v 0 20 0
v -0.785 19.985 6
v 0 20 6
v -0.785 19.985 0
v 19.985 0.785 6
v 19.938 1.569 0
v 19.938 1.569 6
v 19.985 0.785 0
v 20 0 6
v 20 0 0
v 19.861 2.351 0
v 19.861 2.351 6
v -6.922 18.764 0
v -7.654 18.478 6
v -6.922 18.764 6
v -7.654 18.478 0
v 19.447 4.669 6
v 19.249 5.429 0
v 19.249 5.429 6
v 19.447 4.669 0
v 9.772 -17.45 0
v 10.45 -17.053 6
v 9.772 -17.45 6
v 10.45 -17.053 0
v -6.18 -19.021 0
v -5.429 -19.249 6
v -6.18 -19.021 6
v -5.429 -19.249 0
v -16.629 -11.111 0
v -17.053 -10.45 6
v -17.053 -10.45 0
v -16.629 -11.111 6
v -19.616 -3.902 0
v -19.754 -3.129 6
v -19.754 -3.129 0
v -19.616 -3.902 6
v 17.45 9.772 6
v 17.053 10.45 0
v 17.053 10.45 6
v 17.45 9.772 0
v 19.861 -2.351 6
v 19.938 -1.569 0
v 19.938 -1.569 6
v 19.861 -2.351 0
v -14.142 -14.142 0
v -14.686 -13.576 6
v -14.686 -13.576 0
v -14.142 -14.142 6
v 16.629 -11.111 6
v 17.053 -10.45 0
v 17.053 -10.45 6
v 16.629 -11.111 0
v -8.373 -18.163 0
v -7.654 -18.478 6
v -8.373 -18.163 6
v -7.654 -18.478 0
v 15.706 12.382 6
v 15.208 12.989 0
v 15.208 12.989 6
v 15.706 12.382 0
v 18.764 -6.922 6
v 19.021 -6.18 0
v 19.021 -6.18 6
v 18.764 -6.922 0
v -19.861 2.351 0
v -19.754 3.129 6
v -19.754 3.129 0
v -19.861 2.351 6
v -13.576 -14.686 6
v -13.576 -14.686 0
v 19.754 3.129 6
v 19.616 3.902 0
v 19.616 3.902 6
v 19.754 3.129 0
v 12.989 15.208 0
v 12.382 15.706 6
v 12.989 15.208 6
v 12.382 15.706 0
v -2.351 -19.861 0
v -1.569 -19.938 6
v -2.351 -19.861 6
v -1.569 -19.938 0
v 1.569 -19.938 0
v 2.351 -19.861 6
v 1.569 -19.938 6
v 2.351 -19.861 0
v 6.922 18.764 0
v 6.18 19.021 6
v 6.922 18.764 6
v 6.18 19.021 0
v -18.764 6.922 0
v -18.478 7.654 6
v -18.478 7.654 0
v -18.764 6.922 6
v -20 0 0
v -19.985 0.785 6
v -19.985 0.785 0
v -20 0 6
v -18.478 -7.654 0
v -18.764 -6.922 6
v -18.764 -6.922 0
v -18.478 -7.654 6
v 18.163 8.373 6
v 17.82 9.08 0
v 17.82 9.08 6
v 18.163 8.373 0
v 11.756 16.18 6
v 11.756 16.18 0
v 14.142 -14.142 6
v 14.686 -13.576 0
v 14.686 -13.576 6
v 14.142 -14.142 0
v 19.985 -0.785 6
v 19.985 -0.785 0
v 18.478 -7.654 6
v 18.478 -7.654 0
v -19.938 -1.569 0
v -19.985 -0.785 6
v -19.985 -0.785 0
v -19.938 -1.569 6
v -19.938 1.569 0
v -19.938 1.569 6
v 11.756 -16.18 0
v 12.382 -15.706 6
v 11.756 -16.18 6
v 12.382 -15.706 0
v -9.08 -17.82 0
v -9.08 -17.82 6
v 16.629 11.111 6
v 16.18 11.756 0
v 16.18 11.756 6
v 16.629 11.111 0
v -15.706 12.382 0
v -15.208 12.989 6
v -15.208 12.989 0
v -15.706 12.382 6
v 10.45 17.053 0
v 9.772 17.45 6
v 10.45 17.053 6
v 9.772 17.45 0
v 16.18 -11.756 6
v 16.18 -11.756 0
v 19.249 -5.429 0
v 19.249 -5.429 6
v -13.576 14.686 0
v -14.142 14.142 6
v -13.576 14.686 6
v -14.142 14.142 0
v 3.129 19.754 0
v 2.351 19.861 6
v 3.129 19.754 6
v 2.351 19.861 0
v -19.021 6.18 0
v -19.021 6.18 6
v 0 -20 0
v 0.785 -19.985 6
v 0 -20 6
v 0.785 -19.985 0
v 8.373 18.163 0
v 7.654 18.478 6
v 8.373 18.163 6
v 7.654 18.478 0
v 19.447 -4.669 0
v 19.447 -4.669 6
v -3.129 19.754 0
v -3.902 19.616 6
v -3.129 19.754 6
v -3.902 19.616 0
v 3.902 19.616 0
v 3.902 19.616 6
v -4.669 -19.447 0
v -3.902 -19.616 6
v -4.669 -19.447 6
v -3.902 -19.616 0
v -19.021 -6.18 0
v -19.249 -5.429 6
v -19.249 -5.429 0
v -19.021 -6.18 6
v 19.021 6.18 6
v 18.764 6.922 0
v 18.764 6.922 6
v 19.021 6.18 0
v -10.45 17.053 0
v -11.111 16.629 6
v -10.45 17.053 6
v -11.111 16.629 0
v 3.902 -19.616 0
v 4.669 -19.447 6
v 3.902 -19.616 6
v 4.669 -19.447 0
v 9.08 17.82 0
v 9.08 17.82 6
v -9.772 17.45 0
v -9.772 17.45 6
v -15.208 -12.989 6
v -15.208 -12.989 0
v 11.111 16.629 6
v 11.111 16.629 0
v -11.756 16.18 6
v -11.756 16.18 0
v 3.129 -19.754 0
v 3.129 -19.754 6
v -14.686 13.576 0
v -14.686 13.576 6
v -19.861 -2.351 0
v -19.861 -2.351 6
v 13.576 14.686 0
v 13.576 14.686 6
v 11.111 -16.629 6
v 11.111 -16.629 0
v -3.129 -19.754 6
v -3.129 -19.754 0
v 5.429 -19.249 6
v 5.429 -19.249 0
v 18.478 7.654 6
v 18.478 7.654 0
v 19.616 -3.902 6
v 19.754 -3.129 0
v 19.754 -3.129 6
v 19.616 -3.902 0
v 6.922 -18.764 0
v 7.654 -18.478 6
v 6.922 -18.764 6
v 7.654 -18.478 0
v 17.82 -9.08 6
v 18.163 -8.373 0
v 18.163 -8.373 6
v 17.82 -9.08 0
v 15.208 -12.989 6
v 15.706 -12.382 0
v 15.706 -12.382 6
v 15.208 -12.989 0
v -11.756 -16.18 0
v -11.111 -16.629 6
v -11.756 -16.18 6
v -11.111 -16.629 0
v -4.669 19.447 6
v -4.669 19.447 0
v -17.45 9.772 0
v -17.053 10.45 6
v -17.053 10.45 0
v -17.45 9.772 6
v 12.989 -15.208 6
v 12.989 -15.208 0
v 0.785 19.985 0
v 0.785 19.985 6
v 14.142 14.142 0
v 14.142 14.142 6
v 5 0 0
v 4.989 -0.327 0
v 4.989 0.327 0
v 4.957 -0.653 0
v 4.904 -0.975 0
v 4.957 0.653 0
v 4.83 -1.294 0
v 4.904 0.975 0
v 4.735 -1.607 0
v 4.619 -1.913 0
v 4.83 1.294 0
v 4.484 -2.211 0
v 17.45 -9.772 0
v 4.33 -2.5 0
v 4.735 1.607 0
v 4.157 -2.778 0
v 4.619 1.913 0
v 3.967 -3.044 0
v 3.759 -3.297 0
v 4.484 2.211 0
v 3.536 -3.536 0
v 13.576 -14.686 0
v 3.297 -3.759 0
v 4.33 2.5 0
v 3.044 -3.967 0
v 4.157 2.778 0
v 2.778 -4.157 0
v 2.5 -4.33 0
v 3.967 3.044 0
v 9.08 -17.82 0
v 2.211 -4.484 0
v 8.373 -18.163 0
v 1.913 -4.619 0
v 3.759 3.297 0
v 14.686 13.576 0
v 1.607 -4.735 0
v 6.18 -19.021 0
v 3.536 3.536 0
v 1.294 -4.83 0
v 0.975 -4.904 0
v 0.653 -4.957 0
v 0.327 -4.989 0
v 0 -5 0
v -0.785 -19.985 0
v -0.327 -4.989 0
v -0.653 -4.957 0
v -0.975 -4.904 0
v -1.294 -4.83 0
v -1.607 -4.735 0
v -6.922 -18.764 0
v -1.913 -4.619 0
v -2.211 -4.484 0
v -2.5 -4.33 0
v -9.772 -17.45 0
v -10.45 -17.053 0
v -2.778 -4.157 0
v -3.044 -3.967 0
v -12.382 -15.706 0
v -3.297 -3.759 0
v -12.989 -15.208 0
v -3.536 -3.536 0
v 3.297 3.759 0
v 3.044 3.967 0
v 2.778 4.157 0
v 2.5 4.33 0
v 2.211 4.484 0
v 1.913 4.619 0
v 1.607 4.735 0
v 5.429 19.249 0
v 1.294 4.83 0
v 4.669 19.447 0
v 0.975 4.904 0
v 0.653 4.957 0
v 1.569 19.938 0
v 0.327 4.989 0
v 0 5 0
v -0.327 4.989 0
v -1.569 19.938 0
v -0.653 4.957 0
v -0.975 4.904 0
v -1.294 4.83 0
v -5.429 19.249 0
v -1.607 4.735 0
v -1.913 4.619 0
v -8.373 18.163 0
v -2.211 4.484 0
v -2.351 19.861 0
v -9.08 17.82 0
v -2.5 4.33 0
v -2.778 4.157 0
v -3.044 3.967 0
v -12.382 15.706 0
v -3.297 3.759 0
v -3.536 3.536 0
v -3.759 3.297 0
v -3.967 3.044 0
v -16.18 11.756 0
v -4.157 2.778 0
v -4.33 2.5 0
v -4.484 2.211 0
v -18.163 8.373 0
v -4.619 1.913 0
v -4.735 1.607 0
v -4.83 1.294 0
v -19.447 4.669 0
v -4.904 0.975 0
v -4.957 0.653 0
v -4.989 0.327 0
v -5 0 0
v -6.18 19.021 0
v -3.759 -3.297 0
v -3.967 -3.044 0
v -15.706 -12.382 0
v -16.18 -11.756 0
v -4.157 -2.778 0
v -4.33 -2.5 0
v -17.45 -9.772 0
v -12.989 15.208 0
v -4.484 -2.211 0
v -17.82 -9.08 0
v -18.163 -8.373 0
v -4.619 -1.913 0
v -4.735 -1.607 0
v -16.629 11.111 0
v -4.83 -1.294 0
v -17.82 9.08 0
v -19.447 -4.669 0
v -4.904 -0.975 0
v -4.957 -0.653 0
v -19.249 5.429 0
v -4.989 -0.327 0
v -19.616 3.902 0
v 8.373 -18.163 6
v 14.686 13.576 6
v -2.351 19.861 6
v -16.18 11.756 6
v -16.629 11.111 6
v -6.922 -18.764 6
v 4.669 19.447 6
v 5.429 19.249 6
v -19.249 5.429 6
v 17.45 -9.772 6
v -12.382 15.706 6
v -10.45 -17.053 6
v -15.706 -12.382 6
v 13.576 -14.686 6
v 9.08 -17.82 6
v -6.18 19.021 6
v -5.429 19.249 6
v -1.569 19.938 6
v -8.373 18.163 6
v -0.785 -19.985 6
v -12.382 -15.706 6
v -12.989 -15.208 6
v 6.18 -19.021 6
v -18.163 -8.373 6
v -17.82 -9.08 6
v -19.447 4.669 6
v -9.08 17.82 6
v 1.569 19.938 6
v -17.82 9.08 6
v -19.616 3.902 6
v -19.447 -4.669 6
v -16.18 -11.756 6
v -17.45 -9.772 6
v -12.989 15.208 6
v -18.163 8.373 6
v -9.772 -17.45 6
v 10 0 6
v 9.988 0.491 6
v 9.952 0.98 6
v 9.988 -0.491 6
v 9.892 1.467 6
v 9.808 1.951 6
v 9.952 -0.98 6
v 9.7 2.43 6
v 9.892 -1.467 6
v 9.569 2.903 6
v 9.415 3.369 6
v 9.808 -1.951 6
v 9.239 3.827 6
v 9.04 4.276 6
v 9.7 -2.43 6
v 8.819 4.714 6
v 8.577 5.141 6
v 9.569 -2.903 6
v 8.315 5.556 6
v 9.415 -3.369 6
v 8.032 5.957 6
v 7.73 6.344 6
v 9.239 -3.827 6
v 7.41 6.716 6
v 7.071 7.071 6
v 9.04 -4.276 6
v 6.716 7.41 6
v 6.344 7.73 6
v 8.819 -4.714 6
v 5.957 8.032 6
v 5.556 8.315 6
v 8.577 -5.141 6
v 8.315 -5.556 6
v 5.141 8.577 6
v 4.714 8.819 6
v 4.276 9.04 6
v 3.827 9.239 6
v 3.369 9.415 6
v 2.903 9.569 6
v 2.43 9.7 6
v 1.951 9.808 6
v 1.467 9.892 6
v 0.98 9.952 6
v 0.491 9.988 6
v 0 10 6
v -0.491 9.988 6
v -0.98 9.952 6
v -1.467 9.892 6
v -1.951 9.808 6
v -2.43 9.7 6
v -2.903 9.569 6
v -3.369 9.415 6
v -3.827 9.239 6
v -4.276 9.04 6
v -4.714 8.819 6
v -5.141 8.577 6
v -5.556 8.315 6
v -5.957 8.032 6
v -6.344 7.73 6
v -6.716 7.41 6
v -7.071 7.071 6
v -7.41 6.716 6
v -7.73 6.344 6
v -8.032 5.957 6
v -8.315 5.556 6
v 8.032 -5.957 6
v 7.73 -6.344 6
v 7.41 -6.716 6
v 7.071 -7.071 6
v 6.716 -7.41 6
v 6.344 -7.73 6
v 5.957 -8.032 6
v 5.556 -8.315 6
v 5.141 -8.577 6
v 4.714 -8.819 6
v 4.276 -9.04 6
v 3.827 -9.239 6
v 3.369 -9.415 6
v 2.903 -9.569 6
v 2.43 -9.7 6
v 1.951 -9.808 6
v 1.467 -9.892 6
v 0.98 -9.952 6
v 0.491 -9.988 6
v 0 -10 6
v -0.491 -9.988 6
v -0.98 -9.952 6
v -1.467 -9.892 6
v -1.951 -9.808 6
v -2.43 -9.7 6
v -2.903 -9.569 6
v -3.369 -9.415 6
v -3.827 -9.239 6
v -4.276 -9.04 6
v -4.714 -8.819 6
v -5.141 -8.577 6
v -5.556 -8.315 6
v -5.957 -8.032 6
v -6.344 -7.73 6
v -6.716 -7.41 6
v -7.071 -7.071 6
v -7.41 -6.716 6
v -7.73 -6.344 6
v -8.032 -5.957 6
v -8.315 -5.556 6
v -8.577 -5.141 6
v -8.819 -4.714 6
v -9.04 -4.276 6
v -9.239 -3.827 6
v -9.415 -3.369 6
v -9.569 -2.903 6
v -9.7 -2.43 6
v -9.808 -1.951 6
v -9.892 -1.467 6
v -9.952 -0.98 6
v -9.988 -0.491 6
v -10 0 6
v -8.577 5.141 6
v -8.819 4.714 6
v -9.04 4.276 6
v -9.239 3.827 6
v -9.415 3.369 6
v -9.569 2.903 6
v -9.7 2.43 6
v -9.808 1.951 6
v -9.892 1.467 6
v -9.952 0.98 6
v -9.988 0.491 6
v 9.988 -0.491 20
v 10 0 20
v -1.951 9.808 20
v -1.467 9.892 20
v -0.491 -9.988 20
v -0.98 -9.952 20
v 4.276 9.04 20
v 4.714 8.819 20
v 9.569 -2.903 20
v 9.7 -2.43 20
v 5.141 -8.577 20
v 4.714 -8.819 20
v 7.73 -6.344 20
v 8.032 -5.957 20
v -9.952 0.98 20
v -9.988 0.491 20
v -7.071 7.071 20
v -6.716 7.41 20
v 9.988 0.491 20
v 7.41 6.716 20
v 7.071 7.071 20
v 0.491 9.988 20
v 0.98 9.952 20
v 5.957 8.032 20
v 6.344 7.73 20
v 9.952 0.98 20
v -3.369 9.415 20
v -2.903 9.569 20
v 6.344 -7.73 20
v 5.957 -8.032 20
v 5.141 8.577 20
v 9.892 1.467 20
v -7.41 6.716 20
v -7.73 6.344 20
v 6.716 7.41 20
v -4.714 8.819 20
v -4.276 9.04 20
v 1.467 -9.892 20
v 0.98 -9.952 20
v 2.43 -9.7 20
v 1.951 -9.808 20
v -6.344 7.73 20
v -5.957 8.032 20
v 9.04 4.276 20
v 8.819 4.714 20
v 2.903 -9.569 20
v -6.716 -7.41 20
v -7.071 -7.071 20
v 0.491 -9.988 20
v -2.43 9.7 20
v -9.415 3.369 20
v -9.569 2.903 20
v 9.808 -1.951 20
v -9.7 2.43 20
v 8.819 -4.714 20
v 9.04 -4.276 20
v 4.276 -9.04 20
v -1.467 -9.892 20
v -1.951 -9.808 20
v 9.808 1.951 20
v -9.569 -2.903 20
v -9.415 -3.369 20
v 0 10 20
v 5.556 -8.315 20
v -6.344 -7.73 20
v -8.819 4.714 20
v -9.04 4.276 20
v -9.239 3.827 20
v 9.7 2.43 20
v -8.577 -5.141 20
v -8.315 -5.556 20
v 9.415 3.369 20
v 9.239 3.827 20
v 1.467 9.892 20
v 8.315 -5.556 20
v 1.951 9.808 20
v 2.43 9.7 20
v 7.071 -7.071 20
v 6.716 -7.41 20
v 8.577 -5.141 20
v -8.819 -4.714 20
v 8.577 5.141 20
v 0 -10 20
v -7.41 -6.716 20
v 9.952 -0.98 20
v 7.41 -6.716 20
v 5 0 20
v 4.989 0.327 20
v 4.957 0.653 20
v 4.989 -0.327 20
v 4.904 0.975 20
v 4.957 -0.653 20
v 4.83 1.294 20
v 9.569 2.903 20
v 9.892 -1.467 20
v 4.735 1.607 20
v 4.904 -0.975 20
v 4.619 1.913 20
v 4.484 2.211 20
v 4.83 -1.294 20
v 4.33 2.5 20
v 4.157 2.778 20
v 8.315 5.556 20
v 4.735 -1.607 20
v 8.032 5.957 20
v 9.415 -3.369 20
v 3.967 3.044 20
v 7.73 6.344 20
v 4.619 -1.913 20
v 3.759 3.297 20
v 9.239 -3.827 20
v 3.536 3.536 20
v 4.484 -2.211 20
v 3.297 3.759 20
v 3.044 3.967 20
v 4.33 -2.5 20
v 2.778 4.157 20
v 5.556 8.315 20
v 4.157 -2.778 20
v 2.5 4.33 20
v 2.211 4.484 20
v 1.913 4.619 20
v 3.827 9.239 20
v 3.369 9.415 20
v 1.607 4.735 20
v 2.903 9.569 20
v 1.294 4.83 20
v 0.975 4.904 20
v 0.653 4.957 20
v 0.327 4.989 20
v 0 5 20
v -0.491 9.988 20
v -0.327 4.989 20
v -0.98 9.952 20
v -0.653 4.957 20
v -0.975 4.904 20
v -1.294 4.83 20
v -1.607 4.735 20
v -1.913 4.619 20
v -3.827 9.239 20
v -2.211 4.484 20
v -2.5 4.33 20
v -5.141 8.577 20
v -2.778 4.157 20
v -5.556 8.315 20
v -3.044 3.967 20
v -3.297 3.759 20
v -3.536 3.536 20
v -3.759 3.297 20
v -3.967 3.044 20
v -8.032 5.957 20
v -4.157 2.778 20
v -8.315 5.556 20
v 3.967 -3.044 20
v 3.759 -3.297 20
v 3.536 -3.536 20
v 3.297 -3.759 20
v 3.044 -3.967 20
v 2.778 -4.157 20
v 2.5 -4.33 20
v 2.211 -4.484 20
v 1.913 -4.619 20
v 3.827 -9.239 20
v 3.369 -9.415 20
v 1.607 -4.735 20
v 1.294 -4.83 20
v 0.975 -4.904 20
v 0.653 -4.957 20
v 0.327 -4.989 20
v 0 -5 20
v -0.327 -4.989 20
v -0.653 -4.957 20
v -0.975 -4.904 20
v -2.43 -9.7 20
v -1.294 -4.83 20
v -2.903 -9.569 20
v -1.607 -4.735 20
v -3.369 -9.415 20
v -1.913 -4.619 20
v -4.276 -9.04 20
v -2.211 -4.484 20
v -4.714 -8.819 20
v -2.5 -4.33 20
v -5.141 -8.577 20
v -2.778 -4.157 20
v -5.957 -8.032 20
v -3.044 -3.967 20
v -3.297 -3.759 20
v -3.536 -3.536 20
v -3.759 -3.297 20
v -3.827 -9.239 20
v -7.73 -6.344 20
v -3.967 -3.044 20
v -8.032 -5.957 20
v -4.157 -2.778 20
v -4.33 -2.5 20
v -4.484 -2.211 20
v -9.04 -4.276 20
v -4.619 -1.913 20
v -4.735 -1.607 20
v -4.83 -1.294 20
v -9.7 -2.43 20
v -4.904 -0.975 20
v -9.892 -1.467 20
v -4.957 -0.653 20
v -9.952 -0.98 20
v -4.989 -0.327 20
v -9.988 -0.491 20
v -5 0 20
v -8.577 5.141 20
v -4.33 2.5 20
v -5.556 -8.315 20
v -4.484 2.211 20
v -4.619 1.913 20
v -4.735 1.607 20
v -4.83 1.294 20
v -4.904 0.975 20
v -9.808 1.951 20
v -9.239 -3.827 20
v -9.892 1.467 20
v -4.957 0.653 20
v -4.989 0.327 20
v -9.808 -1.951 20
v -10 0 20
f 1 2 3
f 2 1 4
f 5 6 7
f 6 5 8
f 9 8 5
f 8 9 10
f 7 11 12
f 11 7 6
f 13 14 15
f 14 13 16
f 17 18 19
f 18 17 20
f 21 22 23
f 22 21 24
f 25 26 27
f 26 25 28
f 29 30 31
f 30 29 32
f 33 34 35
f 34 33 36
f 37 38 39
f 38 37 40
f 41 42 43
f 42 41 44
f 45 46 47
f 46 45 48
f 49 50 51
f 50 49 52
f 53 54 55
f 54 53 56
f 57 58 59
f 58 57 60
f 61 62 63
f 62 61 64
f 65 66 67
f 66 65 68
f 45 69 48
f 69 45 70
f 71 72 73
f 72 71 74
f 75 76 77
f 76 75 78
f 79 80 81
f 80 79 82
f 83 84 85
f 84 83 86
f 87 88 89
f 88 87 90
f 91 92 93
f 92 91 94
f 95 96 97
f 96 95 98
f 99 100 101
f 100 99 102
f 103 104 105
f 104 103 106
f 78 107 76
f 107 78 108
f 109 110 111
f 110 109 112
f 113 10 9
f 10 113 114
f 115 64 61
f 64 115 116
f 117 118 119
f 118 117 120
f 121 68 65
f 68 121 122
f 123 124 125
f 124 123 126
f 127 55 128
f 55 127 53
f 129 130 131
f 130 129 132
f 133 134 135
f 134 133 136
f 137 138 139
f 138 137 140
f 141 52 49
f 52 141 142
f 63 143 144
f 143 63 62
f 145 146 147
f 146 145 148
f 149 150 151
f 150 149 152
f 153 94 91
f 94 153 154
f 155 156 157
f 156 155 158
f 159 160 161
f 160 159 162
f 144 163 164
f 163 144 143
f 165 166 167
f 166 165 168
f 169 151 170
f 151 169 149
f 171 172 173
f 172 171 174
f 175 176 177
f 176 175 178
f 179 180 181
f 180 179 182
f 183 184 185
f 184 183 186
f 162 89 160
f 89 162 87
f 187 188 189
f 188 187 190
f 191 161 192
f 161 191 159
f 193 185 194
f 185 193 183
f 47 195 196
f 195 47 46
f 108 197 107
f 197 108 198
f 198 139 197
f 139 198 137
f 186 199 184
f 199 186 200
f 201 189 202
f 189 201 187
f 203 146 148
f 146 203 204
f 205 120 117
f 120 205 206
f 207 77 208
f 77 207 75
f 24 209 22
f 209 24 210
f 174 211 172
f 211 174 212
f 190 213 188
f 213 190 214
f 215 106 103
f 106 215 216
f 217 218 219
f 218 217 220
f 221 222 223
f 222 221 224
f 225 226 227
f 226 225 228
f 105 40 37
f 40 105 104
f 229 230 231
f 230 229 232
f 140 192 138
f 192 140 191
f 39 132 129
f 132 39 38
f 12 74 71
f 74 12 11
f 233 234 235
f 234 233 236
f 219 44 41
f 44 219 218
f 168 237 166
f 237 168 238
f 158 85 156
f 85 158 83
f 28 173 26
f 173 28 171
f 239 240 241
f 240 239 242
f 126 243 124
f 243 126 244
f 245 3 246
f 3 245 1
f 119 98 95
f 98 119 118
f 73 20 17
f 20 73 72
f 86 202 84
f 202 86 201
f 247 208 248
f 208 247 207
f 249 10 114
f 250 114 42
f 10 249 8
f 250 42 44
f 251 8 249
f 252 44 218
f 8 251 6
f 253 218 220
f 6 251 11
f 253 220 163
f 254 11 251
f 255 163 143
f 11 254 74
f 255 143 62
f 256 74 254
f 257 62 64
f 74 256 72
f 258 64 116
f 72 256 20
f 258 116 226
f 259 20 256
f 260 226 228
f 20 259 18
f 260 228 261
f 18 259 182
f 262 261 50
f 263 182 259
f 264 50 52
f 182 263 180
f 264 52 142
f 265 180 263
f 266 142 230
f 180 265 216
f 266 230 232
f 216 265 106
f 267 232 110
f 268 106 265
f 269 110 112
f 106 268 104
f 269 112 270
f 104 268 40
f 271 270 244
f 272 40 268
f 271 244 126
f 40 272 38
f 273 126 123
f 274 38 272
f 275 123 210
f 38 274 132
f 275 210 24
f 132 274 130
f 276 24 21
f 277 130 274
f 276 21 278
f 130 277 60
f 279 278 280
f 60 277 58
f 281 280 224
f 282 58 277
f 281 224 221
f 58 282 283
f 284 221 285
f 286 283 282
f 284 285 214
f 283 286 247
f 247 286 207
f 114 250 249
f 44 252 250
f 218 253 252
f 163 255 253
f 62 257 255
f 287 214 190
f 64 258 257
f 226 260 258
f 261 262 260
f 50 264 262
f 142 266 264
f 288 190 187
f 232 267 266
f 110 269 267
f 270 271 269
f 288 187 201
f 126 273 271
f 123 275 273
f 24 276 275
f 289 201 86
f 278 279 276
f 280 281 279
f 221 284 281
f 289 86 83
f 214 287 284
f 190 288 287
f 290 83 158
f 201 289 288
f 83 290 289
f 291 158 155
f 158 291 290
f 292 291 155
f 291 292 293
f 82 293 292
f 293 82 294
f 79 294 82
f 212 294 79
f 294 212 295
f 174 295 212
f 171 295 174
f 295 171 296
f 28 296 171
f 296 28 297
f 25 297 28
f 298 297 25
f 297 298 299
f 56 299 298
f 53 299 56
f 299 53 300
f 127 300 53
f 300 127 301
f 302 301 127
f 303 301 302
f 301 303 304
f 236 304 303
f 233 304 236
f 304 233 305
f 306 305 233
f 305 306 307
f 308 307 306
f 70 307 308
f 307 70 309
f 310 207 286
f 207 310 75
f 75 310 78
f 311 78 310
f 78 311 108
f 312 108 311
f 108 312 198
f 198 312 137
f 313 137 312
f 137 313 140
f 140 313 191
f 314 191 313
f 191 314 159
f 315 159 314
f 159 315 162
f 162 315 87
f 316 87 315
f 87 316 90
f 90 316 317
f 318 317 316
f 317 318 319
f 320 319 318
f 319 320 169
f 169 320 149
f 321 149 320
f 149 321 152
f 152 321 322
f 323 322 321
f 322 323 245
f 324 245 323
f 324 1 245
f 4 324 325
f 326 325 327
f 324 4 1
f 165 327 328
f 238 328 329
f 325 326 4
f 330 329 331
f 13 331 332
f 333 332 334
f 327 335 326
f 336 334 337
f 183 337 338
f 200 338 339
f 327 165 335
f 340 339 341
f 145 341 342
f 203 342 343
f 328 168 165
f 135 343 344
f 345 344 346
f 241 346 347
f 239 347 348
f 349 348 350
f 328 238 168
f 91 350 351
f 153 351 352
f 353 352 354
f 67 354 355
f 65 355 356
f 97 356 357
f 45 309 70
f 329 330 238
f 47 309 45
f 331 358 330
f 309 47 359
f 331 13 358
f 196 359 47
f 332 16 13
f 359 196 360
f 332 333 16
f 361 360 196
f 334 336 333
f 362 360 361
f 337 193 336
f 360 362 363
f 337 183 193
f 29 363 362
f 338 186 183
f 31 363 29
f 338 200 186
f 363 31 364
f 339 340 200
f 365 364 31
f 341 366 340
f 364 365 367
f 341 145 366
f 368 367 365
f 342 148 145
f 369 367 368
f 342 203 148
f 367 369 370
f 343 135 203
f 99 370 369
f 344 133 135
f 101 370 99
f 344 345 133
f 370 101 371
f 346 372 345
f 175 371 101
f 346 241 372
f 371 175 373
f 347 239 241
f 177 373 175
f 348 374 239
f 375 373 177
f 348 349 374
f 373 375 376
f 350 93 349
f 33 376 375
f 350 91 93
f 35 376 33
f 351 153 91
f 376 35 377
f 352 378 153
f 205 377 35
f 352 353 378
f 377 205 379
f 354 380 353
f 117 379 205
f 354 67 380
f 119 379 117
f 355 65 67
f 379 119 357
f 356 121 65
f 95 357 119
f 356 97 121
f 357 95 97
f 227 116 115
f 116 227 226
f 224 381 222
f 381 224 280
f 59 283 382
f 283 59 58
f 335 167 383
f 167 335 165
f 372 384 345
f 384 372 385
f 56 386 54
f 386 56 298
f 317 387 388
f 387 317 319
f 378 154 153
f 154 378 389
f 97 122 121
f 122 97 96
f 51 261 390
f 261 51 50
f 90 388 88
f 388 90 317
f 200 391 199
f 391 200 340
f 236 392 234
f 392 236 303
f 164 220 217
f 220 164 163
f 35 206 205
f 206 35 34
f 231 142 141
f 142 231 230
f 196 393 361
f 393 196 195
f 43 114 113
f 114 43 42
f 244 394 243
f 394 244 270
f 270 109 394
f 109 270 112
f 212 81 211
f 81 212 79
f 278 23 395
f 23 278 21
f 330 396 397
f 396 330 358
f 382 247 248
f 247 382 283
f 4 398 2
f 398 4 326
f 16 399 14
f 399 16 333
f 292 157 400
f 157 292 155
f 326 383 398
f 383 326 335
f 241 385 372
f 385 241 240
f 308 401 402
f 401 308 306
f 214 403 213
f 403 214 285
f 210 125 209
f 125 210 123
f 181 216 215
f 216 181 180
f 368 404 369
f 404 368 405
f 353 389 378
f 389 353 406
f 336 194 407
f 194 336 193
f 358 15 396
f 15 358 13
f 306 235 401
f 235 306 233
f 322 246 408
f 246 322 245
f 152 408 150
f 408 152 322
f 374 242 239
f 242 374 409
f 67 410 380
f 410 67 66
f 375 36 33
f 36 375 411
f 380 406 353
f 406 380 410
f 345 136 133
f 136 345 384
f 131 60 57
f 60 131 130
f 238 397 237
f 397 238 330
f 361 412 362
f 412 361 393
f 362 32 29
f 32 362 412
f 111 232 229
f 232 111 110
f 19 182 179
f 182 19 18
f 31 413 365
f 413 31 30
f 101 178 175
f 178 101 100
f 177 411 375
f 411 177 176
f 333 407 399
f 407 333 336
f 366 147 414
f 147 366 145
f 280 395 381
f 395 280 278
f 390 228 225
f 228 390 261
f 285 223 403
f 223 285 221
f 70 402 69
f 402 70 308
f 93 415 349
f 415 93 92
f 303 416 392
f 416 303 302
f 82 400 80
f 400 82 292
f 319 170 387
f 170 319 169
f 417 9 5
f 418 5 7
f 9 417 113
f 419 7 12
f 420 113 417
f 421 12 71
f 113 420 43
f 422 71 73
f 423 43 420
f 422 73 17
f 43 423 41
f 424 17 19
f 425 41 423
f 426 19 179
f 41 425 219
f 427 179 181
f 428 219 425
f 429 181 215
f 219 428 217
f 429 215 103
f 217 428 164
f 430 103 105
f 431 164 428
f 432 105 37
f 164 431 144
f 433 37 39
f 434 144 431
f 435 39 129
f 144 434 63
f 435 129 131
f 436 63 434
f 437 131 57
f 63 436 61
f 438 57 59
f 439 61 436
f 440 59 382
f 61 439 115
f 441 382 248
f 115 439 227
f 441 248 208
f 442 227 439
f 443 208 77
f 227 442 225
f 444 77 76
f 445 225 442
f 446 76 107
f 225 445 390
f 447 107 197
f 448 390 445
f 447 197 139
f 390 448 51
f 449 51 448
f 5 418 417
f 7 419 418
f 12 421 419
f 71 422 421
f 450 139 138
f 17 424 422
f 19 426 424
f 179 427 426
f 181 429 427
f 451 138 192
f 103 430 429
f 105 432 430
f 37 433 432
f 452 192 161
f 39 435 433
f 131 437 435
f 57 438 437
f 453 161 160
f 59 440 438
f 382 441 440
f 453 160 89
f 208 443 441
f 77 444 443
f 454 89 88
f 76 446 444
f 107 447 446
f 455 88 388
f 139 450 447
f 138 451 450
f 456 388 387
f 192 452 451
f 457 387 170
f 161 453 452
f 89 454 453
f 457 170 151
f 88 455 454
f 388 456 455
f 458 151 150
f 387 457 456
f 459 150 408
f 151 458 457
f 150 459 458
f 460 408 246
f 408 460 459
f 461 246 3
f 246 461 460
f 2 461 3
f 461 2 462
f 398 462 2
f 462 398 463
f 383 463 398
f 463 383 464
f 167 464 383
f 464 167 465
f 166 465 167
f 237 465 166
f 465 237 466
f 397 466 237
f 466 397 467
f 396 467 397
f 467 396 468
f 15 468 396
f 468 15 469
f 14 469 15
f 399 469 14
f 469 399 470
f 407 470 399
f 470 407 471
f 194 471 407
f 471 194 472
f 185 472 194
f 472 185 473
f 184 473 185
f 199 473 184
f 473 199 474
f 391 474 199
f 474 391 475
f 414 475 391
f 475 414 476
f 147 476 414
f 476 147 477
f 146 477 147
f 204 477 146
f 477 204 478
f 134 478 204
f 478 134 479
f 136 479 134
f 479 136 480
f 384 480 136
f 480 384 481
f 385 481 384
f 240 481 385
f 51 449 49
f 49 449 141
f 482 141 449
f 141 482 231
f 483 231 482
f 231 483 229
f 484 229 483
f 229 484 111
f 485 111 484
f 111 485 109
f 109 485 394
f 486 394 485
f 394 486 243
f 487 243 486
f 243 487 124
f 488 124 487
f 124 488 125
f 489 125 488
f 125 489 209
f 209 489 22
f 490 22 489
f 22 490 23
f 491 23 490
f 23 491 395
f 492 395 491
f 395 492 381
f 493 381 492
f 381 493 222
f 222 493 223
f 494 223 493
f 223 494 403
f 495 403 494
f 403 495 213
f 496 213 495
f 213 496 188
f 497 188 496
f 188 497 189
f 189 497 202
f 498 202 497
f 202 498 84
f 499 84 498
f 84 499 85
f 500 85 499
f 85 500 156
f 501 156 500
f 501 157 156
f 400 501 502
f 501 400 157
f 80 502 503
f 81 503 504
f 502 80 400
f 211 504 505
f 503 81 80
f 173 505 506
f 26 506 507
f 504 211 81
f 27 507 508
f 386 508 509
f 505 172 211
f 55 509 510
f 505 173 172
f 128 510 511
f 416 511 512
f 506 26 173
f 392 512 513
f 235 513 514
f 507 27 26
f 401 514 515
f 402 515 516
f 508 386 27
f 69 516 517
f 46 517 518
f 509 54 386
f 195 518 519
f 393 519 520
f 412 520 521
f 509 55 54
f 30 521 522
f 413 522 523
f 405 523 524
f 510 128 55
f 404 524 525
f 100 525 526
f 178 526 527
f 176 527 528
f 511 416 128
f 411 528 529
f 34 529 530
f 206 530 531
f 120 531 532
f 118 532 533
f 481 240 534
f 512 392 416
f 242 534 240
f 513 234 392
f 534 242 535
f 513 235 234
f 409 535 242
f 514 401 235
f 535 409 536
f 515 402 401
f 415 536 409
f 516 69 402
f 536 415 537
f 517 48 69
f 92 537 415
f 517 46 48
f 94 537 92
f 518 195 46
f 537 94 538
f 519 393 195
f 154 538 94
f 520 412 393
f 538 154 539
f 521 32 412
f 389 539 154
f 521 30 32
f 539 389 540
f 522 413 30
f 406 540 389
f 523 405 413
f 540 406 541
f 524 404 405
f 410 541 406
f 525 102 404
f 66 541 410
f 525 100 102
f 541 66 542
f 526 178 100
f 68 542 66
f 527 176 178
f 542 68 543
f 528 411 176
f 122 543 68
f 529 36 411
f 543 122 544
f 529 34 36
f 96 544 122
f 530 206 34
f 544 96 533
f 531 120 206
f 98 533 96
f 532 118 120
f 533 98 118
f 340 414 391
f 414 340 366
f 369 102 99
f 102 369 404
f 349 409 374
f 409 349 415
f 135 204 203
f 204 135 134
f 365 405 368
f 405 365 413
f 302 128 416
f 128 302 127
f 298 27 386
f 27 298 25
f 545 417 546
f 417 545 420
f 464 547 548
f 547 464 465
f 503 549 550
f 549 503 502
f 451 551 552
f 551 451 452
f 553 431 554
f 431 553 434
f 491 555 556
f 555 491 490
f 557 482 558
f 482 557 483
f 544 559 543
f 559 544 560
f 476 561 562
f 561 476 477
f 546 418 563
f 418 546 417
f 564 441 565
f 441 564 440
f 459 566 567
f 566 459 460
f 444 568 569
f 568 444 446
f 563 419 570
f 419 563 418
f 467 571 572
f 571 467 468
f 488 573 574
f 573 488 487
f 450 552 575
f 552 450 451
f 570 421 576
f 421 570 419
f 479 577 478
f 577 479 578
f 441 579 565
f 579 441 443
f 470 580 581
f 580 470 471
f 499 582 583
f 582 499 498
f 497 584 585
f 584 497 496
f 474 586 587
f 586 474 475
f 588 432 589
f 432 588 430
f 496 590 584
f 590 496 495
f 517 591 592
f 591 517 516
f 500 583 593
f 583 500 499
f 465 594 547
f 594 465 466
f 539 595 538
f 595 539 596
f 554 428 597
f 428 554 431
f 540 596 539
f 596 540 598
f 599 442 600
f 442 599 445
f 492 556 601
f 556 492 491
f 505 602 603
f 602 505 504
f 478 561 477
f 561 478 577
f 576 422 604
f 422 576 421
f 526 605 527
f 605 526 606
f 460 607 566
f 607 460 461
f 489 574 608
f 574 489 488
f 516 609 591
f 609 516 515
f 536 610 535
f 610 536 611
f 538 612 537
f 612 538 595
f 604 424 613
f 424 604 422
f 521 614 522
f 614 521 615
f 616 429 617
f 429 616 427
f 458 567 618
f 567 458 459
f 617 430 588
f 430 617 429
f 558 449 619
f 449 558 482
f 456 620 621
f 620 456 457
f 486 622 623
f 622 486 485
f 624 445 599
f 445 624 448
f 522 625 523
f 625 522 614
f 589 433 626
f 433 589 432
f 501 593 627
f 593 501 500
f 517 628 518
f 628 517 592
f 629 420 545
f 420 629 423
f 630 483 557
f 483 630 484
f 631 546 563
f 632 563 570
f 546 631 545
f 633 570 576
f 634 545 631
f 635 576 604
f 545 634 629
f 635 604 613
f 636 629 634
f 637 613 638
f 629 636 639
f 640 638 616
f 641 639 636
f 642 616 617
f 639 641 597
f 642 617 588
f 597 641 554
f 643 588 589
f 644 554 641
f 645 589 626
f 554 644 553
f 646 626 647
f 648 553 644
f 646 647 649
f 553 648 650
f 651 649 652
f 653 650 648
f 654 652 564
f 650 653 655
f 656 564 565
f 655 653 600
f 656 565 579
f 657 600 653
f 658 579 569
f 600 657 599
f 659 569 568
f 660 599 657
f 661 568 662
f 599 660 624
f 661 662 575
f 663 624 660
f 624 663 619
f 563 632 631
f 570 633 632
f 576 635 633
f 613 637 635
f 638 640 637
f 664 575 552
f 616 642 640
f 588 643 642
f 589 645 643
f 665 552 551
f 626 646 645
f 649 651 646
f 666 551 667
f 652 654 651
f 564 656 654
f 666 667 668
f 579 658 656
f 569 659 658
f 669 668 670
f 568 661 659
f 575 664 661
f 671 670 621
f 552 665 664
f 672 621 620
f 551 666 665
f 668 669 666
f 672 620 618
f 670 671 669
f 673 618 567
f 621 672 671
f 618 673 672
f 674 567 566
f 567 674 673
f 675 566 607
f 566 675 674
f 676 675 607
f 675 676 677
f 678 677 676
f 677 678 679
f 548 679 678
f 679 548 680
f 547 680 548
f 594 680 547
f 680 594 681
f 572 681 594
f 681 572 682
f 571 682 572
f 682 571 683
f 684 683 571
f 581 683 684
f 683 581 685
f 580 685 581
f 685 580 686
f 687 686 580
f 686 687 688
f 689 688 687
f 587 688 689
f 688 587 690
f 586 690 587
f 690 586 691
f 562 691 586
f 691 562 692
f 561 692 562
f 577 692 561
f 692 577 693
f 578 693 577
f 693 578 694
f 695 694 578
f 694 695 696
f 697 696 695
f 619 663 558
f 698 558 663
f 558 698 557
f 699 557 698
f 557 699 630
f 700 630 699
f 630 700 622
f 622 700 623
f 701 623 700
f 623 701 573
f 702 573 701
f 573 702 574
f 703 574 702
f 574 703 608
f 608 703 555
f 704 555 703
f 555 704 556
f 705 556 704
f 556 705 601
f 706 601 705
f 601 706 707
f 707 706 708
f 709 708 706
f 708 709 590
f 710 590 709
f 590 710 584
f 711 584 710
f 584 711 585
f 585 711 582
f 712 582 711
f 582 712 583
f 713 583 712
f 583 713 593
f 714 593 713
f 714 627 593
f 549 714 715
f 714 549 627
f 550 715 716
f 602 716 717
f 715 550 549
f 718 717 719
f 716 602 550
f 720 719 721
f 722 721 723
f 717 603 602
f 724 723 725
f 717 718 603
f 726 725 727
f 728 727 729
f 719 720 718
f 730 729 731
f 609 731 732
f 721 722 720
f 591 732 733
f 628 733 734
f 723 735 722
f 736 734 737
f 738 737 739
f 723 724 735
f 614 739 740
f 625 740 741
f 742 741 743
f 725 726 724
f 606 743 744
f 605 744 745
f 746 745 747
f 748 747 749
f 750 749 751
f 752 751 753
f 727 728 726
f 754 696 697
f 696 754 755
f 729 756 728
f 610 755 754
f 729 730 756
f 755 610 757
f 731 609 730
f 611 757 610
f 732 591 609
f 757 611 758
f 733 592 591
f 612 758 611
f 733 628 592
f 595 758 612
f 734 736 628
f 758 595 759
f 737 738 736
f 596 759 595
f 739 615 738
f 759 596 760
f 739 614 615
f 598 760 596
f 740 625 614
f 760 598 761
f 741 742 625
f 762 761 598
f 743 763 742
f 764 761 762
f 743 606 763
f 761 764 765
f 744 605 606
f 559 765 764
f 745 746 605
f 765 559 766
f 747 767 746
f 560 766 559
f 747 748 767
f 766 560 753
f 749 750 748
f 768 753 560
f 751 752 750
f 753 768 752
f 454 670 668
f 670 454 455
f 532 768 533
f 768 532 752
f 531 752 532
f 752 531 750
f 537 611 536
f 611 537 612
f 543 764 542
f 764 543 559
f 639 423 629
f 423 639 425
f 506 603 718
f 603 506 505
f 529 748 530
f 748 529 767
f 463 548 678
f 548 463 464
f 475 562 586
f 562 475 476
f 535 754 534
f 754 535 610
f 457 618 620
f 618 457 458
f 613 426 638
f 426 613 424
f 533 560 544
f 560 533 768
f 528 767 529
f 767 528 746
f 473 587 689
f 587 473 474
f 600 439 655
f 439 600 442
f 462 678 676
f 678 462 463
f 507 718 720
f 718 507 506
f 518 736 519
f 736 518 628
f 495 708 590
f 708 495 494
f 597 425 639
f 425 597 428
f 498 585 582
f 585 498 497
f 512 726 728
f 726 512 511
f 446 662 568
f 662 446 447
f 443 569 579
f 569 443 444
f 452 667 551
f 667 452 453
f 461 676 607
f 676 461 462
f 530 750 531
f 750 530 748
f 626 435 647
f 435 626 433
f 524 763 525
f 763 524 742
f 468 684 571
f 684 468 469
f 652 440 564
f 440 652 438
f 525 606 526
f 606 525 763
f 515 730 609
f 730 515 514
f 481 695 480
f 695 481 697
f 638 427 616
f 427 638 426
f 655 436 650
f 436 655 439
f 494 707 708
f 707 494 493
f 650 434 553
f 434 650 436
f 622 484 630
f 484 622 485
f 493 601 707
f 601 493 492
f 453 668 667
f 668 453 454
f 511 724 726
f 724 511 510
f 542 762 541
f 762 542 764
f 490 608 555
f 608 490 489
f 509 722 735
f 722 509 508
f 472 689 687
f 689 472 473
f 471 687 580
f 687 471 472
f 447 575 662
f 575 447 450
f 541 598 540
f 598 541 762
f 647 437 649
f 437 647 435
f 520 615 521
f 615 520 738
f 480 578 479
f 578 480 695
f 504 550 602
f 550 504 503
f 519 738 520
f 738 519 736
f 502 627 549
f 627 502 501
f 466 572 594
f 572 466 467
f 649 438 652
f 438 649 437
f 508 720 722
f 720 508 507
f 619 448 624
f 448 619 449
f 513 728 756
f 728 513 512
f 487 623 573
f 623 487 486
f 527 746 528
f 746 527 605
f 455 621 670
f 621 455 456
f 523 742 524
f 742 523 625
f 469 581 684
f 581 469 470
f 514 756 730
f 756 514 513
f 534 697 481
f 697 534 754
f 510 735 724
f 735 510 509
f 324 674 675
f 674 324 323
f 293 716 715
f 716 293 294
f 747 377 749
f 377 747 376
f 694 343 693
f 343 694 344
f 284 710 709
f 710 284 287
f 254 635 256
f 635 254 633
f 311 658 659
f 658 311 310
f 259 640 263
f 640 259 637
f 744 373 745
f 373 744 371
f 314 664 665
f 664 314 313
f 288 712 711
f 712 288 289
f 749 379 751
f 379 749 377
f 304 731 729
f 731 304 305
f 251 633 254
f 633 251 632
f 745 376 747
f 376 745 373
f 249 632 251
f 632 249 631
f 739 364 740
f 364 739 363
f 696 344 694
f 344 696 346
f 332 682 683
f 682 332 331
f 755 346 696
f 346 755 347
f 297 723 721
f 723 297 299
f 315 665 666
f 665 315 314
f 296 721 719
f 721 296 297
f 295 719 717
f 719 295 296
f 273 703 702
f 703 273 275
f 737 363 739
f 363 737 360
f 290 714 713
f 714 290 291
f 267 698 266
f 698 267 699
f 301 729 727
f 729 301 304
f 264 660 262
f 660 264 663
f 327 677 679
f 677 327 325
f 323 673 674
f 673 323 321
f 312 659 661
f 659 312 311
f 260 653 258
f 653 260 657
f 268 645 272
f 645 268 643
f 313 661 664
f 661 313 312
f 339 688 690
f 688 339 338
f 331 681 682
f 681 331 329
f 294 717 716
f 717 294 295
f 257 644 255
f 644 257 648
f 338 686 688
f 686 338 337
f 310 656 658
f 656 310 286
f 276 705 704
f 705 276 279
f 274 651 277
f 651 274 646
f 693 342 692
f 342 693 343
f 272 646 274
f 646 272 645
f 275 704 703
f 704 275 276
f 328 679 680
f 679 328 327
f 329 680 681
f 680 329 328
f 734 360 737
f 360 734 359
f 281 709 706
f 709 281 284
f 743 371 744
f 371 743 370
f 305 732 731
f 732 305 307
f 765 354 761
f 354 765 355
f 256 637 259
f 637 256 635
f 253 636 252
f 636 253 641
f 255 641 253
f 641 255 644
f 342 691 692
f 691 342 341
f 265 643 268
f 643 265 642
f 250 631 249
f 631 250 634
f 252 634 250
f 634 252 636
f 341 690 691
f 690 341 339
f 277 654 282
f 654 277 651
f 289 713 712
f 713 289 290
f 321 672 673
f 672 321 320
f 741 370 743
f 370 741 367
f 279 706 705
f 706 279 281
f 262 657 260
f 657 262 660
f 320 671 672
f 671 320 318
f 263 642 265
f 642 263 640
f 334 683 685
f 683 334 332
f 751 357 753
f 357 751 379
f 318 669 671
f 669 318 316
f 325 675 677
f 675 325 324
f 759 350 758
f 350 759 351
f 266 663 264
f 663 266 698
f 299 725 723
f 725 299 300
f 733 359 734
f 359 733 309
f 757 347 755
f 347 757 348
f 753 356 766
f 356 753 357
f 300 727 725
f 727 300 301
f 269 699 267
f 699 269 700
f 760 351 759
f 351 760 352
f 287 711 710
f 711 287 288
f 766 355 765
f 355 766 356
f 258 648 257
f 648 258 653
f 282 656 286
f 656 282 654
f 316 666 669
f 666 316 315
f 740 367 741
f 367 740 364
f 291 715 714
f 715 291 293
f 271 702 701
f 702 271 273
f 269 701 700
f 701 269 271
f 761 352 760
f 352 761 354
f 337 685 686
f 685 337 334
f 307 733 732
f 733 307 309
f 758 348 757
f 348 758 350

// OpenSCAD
// Flanged bushing: a 40 mm diameter flange 6 mm thick with a 20 mm diameter hub
// 14 mm tall on top (20 mm overall), and a 10 mm bore through both.
difference() {
  union() {
    cylinder(d = 40, h = 6, $fn = 160);
    cylinder(d = 20, h = 20, $fn = 128);
  }
  translate([0, 0, -1]) cylinder(d = 10, h = 22, $fn = 96);
}
